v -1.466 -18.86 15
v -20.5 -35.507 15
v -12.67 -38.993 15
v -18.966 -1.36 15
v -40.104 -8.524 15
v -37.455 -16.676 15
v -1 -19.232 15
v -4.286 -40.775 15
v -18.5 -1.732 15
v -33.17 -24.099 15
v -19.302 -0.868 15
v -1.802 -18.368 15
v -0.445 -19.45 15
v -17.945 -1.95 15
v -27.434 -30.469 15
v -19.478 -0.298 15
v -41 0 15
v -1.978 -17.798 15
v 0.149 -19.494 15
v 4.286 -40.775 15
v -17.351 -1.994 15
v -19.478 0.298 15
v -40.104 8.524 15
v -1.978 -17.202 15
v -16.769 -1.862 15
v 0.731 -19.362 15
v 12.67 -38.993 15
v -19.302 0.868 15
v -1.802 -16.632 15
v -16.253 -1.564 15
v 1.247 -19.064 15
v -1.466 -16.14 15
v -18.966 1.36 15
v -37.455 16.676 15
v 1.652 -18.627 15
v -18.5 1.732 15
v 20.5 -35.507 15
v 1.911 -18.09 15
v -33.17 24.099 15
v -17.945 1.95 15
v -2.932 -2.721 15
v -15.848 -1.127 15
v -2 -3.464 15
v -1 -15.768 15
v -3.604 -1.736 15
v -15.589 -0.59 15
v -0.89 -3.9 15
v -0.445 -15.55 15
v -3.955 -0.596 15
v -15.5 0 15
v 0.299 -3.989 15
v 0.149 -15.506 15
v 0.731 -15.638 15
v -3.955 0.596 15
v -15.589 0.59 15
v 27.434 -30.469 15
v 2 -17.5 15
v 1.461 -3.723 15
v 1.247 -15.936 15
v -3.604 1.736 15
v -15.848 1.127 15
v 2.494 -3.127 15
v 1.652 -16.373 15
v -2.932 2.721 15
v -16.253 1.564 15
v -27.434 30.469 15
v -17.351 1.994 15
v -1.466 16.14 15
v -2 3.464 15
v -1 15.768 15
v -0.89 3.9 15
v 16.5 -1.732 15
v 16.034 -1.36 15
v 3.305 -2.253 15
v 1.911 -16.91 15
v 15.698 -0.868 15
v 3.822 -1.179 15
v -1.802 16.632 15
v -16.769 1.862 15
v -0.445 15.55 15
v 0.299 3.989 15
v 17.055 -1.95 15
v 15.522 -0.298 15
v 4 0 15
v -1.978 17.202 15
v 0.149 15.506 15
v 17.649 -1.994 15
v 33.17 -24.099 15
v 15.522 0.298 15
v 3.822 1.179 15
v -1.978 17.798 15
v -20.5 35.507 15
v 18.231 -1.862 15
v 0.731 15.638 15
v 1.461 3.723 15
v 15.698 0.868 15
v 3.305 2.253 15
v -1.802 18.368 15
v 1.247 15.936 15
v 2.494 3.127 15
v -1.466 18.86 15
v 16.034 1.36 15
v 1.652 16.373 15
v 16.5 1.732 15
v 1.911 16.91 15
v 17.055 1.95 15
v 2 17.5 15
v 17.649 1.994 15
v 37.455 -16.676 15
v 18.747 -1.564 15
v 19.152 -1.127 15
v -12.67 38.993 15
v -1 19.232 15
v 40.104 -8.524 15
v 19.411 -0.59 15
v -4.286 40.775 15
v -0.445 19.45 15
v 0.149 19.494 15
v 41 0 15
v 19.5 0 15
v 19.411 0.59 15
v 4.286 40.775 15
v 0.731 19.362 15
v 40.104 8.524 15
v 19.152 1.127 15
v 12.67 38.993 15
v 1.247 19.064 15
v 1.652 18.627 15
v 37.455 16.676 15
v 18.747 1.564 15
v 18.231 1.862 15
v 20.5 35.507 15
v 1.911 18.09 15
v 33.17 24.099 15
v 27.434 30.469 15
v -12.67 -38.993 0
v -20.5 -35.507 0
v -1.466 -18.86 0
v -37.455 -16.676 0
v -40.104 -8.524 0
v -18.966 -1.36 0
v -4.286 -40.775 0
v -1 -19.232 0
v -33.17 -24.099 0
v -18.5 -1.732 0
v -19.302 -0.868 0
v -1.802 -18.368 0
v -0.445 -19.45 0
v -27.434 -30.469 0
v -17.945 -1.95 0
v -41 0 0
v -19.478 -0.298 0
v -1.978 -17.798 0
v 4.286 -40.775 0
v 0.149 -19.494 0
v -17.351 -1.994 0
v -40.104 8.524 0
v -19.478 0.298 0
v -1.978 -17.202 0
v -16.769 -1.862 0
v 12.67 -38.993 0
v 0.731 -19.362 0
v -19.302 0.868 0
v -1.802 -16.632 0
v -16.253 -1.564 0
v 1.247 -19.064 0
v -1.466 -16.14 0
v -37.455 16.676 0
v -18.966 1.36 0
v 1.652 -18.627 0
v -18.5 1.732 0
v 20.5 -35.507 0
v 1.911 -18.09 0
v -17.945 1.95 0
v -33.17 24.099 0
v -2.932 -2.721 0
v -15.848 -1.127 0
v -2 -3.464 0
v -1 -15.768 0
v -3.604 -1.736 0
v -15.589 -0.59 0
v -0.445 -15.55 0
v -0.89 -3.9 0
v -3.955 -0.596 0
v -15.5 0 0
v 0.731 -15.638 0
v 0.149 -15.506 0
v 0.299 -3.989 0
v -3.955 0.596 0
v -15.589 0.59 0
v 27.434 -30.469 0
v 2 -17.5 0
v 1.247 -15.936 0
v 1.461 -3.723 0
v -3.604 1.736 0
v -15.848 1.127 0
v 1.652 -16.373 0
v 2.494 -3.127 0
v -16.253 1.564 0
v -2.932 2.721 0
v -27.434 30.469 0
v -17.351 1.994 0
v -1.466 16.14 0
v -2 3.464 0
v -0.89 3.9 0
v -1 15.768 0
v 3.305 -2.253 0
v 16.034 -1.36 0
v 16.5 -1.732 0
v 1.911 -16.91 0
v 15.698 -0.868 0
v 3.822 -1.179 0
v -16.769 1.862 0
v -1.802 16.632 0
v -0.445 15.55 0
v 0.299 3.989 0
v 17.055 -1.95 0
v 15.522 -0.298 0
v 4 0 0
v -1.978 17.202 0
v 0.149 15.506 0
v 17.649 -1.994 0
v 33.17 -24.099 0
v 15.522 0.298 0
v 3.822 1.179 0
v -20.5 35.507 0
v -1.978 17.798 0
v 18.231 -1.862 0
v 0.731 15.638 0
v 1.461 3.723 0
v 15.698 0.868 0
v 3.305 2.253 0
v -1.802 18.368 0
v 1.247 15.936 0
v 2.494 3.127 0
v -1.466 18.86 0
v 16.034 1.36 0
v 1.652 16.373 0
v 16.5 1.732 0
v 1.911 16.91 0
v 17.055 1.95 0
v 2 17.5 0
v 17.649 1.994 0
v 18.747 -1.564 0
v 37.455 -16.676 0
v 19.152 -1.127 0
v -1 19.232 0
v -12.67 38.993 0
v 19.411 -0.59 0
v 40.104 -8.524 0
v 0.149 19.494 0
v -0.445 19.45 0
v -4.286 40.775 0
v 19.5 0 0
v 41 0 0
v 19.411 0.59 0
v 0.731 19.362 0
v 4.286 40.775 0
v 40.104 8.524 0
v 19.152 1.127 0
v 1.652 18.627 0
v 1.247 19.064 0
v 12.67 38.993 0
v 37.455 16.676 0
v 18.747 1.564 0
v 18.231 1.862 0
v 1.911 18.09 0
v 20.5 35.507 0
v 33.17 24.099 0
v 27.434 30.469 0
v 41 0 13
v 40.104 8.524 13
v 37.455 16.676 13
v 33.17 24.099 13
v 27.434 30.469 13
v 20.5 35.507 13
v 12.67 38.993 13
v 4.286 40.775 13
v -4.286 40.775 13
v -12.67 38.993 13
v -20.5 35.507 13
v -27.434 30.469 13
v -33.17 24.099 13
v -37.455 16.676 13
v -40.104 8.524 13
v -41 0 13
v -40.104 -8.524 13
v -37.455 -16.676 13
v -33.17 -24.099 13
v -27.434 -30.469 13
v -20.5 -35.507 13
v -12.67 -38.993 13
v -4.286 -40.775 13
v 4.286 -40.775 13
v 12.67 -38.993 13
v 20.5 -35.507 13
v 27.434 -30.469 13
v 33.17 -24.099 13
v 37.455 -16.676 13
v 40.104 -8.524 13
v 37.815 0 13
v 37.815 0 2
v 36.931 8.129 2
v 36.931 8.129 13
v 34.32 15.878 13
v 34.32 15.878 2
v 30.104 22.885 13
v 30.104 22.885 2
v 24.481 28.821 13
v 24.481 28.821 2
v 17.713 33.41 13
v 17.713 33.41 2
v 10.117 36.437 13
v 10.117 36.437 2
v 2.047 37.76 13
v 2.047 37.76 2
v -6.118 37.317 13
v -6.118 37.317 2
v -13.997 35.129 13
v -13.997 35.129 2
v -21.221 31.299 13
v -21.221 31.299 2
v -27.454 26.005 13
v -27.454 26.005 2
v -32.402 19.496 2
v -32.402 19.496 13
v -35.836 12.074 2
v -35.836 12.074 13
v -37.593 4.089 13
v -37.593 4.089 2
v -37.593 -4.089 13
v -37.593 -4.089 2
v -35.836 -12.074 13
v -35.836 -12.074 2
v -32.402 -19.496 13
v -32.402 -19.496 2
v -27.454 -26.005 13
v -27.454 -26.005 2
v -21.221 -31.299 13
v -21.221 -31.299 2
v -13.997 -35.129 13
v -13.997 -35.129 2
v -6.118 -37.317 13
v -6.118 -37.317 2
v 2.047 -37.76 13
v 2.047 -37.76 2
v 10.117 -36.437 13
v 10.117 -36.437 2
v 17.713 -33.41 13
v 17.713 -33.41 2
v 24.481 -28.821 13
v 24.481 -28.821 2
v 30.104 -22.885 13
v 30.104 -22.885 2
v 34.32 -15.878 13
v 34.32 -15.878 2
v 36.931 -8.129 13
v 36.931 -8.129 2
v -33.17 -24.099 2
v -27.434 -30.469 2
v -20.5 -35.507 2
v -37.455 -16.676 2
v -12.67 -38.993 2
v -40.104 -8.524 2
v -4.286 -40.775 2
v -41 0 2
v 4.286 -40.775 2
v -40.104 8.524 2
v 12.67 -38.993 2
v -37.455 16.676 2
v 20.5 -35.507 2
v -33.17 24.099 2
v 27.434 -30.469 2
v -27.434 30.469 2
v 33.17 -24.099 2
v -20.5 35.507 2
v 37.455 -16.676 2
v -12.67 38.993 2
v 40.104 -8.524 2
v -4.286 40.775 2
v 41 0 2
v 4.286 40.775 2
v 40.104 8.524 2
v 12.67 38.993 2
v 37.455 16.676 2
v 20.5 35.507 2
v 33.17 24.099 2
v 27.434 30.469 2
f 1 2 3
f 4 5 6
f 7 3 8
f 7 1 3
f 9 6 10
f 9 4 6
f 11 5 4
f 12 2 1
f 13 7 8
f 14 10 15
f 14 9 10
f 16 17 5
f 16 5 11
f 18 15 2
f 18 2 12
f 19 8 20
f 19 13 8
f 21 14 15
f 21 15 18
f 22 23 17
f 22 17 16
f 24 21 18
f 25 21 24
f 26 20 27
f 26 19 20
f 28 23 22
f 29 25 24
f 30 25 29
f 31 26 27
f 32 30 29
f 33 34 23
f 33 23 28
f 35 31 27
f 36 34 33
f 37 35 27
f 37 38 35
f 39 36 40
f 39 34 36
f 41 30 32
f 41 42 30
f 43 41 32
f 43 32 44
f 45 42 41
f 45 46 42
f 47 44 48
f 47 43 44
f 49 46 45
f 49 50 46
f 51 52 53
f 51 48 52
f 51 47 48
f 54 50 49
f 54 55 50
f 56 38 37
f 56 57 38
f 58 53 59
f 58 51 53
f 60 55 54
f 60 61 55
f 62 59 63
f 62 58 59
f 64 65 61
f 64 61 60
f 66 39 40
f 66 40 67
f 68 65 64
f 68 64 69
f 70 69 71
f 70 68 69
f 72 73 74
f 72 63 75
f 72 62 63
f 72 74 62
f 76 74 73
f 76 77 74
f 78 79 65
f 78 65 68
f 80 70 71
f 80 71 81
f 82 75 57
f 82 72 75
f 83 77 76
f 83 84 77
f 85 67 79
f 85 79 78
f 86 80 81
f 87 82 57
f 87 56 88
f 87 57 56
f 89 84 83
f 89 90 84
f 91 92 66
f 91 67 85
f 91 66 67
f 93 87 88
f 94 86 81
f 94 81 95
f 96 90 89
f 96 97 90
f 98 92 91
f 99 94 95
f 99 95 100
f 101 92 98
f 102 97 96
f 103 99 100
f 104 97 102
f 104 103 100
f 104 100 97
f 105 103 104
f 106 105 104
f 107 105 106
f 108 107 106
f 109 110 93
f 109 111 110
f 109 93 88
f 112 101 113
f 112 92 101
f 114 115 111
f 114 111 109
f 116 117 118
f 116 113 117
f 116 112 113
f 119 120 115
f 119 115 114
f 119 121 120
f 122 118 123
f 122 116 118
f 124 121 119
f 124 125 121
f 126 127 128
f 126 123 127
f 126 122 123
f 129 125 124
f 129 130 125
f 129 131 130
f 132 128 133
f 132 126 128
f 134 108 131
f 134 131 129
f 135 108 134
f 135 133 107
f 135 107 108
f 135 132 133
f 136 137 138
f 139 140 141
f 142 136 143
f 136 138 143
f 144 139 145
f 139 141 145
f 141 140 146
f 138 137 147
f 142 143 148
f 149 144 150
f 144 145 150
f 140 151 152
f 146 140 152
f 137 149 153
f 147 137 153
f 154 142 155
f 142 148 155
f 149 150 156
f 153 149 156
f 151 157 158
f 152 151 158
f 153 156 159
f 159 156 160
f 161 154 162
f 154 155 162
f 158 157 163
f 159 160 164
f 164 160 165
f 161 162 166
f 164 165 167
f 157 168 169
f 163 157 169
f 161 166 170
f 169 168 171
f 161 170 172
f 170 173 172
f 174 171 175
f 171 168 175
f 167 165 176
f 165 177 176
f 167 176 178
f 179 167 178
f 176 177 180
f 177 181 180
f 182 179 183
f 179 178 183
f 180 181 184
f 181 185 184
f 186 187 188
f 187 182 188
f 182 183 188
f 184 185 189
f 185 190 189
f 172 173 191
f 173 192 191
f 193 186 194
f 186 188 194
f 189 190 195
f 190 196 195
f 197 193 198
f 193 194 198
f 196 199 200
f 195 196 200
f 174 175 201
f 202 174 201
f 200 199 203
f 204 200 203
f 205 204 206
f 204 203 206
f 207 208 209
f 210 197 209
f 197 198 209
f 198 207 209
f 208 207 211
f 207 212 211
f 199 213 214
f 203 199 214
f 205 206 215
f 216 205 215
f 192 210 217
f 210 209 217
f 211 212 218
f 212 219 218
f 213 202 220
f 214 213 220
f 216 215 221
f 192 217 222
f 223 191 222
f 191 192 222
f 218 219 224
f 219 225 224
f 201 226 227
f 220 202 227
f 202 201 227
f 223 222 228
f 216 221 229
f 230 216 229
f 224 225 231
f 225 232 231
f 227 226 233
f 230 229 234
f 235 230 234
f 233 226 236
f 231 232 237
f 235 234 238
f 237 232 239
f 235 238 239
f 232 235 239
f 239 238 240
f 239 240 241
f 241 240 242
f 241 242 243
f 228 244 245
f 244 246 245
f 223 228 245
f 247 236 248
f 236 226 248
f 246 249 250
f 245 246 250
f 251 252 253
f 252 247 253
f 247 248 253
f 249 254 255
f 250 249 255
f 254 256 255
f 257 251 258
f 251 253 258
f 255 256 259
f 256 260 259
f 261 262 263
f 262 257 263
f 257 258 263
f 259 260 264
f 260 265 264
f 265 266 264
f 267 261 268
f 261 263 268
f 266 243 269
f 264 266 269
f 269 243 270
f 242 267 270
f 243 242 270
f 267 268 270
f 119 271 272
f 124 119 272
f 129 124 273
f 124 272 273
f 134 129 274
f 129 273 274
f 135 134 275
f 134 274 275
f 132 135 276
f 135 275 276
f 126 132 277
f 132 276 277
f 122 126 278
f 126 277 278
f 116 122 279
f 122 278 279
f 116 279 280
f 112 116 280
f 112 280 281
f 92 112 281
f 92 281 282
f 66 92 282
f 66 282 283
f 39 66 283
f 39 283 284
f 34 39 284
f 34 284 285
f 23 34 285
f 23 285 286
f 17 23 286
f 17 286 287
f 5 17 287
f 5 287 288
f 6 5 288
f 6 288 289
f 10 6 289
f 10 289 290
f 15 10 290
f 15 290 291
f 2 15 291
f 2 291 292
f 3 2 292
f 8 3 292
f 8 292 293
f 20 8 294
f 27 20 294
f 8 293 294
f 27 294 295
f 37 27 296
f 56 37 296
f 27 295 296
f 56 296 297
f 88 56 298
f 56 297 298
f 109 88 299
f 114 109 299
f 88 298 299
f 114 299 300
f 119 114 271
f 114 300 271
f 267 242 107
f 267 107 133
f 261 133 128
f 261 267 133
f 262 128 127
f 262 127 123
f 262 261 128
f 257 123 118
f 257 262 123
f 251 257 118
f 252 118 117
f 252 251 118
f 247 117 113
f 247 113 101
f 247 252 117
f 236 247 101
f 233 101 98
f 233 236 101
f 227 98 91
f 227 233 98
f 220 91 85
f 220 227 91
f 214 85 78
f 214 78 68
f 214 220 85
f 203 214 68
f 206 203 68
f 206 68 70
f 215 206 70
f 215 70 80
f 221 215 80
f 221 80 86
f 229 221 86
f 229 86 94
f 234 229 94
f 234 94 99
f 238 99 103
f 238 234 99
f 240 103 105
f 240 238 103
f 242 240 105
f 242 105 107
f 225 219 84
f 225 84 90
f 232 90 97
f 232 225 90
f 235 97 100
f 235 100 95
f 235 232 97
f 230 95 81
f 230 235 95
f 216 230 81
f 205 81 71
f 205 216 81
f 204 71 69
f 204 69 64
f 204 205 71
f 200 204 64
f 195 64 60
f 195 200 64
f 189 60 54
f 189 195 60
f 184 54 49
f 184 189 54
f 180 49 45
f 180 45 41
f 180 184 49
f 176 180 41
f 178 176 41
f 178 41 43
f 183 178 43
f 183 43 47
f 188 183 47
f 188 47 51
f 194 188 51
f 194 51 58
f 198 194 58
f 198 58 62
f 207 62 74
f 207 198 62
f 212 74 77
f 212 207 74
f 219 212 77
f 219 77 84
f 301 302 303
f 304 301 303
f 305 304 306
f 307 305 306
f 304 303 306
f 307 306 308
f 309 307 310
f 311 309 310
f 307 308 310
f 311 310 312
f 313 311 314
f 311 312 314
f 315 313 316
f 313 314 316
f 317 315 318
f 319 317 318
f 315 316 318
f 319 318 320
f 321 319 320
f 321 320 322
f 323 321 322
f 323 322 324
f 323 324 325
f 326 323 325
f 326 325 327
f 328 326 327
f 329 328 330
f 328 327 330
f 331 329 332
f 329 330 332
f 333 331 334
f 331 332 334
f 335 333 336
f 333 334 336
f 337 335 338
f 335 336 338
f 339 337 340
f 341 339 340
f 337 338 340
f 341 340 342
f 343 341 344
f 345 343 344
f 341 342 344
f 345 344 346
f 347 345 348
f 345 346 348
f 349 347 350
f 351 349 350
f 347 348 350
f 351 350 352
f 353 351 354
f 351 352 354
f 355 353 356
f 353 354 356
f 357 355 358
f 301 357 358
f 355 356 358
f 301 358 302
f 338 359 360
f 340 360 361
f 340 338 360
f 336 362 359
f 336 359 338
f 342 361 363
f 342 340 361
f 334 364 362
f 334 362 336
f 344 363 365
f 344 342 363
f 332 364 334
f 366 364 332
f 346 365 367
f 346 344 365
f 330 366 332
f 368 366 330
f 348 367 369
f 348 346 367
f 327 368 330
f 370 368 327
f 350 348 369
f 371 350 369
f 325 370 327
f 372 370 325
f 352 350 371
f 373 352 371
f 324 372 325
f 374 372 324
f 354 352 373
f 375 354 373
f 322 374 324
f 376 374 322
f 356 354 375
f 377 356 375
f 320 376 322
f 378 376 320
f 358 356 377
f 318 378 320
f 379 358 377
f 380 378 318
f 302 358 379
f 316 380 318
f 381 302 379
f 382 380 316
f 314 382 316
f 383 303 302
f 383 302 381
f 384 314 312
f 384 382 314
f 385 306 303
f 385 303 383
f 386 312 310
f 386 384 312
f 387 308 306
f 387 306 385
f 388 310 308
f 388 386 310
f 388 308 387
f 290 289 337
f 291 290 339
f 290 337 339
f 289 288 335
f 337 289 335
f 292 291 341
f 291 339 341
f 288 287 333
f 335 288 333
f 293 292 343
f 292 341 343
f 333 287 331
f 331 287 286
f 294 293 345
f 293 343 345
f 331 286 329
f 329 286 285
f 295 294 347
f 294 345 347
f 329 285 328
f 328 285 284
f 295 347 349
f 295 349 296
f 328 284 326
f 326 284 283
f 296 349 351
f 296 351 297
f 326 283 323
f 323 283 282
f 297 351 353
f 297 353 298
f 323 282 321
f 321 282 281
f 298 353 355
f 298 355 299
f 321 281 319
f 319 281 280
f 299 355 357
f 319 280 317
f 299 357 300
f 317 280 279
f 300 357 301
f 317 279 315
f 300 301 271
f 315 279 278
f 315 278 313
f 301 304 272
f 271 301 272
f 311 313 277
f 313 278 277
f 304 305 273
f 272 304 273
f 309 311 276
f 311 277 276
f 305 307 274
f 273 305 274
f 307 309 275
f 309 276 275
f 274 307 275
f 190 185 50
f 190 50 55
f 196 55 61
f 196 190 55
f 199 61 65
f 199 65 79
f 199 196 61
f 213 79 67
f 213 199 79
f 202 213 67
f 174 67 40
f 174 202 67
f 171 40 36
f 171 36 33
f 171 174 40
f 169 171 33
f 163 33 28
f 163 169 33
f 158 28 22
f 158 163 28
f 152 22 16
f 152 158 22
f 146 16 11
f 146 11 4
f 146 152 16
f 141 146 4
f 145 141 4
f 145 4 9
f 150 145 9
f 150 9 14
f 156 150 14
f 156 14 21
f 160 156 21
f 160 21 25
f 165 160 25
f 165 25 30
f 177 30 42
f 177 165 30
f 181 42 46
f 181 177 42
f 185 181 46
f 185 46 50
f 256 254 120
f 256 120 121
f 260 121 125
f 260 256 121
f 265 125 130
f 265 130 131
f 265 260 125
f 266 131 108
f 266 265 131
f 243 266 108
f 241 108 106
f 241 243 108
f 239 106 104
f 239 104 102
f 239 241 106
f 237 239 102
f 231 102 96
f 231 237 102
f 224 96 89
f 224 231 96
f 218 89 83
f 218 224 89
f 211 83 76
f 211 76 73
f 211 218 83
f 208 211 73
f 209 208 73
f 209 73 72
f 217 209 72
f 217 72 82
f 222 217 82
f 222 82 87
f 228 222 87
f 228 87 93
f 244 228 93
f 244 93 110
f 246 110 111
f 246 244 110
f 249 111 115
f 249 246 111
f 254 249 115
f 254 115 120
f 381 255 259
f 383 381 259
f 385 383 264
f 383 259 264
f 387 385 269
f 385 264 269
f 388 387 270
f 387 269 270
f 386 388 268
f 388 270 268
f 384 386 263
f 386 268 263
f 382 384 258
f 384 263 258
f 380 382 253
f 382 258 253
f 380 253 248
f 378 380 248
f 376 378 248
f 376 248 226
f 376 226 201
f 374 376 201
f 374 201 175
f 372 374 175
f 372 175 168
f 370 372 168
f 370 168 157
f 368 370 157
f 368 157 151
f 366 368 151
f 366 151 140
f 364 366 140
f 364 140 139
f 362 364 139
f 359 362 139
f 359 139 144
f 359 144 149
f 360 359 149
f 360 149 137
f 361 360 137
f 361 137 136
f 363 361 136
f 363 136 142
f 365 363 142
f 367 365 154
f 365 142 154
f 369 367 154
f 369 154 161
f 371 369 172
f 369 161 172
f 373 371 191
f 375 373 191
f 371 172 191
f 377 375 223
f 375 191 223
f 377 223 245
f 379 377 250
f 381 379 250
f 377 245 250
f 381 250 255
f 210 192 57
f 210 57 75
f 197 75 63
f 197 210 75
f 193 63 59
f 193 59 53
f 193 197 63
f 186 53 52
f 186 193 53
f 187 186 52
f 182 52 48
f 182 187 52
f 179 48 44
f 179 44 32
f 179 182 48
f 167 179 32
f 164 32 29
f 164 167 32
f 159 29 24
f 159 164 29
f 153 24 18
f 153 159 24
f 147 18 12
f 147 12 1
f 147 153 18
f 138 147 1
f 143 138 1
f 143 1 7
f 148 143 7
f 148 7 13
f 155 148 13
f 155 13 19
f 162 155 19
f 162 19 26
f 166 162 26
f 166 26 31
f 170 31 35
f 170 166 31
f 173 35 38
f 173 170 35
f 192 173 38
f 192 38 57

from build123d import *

# Parameters (mm, degrees)
SKETCH_1_R          = 41
SKETCH_1_R_2        = 4
SKETCH_1_R_3        = 2
EXTRUDE_1_DEPTH     = 15
CUT_EXTRUDE_START   = -13
SKETCH_3_R          = 41
SKETCH_3_R_2        = 37.815
CUT_EXTRUDE_1_DEPTH = 11


with BuildPart() as part:
    # 草图1 → 凸台-拉伸1 (new body)
    with BuildSketch(Plane.XY):
        Circle(SKETCH_1_R)
        Circle(SKETCH_1_R_2, mode=Mode.SUBTRACT)
        with Locations((-17.5, 0)):
            Circle(SKETCH_1_R_3, mode=Mode.SUBTRACT)
        with Locations((0, 17.5)):
            Circle(SKETCH_1_R_3, mode=Mode.SUBTRACT)
        with Locations((17.5, 0)):
            Circle(SKETCH_1_R_3, mode=Mode.SUBTRACT)
        with Locations((0, -17.5)):
            Circle(SKETCH_1_R_3, mode=Mode.SUBTRACT)
    extrude(amount=EXTRUDE_1_DEPTH)

    # 草图3 → 切除-拉伸1 (cut)
    with BuildSketch(Plane.XY.offset(15).offset(CUT_EXTRUDE_START)):
        Circle(SKETCH_3_R)
        Circle(SKETCH_3_R_2, mode=Mode.SUBTRACT)
    extrude(amount=CUT_EXTRUDE_1_DEPTH, mode=Mode.SUBTRACT)


solid = part.part
